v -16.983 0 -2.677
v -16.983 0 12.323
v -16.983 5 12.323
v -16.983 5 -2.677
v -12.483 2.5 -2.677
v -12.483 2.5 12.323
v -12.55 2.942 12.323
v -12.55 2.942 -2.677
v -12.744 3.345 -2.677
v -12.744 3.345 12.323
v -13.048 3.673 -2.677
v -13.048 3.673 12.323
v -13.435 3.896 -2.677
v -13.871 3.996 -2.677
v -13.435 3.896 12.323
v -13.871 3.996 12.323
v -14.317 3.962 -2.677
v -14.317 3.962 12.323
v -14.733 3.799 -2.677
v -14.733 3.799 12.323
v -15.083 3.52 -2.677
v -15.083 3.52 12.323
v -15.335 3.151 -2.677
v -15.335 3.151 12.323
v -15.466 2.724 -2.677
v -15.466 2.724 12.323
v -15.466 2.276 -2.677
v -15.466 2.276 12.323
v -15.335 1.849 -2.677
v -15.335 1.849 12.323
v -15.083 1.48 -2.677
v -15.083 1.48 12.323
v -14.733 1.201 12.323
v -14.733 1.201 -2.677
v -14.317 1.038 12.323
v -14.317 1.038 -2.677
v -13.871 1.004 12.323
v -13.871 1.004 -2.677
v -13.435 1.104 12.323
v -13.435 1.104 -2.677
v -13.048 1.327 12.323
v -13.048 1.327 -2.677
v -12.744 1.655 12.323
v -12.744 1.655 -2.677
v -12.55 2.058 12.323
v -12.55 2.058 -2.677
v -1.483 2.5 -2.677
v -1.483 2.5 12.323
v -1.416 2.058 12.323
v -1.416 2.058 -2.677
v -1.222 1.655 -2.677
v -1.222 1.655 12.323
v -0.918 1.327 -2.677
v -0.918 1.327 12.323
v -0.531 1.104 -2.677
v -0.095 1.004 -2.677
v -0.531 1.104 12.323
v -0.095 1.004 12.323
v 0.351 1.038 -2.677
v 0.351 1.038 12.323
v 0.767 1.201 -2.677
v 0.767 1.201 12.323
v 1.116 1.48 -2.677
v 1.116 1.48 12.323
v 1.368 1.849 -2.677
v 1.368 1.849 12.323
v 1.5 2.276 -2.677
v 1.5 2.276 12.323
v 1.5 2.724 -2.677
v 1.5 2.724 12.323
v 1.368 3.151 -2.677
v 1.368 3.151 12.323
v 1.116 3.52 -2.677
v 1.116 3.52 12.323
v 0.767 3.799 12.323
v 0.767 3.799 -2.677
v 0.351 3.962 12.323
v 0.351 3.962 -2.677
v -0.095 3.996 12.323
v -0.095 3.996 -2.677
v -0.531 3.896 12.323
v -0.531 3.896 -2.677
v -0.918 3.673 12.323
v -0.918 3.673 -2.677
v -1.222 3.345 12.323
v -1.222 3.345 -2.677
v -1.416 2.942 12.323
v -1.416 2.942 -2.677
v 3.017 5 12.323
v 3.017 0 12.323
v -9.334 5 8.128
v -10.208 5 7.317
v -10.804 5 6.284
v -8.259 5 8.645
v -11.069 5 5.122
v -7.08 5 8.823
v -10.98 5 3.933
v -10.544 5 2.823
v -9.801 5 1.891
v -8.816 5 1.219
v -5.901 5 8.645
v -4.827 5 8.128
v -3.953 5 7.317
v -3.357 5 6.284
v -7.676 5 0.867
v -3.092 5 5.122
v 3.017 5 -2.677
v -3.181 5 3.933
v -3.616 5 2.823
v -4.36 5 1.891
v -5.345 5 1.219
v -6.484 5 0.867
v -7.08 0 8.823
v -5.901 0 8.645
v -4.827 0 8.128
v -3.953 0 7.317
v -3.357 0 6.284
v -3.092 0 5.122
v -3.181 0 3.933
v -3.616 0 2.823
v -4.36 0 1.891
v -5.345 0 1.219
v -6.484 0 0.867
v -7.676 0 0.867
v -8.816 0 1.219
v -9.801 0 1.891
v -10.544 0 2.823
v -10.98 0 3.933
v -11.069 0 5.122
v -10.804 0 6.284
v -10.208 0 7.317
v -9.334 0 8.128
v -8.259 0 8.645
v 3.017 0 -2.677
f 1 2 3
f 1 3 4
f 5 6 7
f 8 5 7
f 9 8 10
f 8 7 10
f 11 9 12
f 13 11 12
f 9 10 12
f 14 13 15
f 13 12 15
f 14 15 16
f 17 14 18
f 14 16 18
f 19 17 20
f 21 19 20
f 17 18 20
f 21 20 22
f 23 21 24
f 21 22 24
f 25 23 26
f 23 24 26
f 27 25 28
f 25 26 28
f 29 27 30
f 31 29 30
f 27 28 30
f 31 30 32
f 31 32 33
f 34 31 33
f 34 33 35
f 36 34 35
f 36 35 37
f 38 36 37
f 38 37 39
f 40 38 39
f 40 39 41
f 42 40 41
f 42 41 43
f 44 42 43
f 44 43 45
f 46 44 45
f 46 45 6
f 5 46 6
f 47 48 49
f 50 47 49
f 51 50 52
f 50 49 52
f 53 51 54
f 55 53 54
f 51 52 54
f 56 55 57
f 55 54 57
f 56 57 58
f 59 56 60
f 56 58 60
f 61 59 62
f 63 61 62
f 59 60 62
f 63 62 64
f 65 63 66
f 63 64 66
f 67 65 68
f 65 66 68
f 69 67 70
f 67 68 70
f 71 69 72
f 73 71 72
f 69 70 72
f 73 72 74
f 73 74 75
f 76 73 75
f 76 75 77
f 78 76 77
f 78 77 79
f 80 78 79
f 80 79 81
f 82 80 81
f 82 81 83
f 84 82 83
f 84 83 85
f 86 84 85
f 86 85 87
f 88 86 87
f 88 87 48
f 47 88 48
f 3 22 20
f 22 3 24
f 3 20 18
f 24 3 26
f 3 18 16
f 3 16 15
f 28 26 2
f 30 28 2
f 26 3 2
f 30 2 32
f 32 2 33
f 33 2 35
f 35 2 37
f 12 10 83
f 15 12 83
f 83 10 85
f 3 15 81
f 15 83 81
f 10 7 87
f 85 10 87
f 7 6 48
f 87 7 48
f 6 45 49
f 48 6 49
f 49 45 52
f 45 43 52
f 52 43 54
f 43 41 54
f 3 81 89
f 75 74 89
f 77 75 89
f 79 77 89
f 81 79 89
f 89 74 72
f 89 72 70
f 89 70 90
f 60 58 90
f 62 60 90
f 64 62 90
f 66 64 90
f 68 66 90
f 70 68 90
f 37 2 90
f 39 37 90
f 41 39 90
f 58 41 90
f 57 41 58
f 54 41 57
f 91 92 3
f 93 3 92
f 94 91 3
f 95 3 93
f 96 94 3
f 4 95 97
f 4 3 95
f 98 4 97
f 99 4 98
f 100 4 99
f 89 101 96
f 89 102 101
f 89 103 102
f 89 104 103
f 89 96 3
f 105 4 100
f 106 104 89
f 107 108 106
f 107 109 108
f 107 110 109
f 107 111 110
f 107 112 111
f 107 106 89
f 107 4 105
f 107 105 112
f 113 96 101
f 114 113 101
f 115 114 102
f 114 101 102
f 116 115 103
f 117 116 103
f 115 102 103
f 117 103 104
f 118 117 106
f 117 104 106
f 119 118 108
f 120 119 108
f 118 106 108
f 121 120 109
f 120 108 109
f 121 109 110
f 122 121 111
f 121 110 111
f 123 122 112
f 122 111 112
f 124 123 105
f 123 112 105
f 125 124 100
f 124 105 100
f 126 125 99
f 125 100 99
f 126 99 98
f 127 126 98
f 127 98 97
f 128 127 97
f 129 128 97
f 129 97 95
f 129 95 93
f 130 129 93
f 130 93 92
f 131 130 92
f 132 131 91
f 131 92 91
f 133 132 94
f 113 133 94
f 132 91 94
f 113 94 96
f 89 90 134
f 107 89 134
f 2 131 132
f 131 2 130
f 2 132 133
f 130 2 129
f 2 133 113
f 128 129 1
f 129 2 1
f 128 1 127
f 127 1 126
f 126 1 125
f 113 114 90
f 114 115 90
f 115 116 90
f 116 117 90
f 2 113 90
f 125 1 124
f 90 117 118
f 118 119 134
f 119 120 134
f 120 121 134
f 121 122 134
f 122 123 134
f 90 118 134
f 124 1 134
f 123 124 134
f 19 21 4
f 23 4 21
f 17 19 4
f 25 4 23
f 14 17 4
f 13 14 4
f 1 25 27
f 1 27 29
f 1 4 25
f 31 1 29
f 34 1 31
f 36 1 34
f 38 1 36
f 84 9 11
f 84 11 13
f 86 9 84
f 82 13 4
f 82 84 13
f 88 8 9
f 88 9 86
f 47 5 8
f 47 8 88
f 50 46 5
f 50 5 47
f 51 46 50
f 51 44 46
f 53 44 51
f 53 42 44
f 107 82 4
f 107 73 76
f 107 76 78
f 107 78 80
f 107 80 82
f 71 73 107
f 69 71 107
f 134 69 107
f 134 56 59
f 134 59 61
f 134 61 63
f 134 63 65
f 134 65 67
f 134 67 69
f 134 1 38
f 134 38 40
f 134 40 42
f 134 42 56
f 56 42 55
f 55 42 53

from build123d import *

# Parameters (mm, degrees)
SKETCH1_W           = 20
SKETCH1_H           = 15
BOSS_EXTRUDE1_DEPTH = 5
SKETCH2_R           = 1.5
CUT_EXTRUDE1_DEPTH  = 24.203994107
SKETCH3_R           = 4
CUT_EXTRUDE2_DEPTH  = 5


with BuildPart() as part:
    # Sketch1 → Boss-Extrude1 (new body)
    with BuildSketch(Plane(origin=(0, 0, 0), x_dir=(1, 0, 0), z_dir=(0, 1, 0))):
        with Locations((-6.983089899, -4.822749115)):
            Rectangle(SKETCH1_W, SKETCH1_H)
    extrude(amount=BOSS_EXTRUDE1_DEPTH)

    # Sketch2 → Cut-Extrude1 (cut, through all)
    with BuildSketch(Plane.XY.offset(12.322749115)):
        with Locations((-13.983089899, 2.5)):
            Circle(SKETCH2_R)
        with Locations(Location((0.016910101, 2.5, 0), (0, 0, 180))):
            Circle(SKETCH2_R)
    extrude(amount=-CUT_EXTRUDE1_DEPTH, mode=Mode.SUBTRACT)

    # Sketch3 → Cut-Extrude2 (cut)
    with BuildSketch(Plane(origin=(0, 5, 0), x_dir=(1, 0, 0), z_dir=(0, 1, 0))):
        with Locations(Location((-7.080321074, -4.822749115, 0), (0, 0, 270))):
            Circle(SKETCH3_R)
    extrude(amount=-CUT_EXTRUDE2_DEPTH, mode=Mode.SUBTRACT)


solid = part.part
